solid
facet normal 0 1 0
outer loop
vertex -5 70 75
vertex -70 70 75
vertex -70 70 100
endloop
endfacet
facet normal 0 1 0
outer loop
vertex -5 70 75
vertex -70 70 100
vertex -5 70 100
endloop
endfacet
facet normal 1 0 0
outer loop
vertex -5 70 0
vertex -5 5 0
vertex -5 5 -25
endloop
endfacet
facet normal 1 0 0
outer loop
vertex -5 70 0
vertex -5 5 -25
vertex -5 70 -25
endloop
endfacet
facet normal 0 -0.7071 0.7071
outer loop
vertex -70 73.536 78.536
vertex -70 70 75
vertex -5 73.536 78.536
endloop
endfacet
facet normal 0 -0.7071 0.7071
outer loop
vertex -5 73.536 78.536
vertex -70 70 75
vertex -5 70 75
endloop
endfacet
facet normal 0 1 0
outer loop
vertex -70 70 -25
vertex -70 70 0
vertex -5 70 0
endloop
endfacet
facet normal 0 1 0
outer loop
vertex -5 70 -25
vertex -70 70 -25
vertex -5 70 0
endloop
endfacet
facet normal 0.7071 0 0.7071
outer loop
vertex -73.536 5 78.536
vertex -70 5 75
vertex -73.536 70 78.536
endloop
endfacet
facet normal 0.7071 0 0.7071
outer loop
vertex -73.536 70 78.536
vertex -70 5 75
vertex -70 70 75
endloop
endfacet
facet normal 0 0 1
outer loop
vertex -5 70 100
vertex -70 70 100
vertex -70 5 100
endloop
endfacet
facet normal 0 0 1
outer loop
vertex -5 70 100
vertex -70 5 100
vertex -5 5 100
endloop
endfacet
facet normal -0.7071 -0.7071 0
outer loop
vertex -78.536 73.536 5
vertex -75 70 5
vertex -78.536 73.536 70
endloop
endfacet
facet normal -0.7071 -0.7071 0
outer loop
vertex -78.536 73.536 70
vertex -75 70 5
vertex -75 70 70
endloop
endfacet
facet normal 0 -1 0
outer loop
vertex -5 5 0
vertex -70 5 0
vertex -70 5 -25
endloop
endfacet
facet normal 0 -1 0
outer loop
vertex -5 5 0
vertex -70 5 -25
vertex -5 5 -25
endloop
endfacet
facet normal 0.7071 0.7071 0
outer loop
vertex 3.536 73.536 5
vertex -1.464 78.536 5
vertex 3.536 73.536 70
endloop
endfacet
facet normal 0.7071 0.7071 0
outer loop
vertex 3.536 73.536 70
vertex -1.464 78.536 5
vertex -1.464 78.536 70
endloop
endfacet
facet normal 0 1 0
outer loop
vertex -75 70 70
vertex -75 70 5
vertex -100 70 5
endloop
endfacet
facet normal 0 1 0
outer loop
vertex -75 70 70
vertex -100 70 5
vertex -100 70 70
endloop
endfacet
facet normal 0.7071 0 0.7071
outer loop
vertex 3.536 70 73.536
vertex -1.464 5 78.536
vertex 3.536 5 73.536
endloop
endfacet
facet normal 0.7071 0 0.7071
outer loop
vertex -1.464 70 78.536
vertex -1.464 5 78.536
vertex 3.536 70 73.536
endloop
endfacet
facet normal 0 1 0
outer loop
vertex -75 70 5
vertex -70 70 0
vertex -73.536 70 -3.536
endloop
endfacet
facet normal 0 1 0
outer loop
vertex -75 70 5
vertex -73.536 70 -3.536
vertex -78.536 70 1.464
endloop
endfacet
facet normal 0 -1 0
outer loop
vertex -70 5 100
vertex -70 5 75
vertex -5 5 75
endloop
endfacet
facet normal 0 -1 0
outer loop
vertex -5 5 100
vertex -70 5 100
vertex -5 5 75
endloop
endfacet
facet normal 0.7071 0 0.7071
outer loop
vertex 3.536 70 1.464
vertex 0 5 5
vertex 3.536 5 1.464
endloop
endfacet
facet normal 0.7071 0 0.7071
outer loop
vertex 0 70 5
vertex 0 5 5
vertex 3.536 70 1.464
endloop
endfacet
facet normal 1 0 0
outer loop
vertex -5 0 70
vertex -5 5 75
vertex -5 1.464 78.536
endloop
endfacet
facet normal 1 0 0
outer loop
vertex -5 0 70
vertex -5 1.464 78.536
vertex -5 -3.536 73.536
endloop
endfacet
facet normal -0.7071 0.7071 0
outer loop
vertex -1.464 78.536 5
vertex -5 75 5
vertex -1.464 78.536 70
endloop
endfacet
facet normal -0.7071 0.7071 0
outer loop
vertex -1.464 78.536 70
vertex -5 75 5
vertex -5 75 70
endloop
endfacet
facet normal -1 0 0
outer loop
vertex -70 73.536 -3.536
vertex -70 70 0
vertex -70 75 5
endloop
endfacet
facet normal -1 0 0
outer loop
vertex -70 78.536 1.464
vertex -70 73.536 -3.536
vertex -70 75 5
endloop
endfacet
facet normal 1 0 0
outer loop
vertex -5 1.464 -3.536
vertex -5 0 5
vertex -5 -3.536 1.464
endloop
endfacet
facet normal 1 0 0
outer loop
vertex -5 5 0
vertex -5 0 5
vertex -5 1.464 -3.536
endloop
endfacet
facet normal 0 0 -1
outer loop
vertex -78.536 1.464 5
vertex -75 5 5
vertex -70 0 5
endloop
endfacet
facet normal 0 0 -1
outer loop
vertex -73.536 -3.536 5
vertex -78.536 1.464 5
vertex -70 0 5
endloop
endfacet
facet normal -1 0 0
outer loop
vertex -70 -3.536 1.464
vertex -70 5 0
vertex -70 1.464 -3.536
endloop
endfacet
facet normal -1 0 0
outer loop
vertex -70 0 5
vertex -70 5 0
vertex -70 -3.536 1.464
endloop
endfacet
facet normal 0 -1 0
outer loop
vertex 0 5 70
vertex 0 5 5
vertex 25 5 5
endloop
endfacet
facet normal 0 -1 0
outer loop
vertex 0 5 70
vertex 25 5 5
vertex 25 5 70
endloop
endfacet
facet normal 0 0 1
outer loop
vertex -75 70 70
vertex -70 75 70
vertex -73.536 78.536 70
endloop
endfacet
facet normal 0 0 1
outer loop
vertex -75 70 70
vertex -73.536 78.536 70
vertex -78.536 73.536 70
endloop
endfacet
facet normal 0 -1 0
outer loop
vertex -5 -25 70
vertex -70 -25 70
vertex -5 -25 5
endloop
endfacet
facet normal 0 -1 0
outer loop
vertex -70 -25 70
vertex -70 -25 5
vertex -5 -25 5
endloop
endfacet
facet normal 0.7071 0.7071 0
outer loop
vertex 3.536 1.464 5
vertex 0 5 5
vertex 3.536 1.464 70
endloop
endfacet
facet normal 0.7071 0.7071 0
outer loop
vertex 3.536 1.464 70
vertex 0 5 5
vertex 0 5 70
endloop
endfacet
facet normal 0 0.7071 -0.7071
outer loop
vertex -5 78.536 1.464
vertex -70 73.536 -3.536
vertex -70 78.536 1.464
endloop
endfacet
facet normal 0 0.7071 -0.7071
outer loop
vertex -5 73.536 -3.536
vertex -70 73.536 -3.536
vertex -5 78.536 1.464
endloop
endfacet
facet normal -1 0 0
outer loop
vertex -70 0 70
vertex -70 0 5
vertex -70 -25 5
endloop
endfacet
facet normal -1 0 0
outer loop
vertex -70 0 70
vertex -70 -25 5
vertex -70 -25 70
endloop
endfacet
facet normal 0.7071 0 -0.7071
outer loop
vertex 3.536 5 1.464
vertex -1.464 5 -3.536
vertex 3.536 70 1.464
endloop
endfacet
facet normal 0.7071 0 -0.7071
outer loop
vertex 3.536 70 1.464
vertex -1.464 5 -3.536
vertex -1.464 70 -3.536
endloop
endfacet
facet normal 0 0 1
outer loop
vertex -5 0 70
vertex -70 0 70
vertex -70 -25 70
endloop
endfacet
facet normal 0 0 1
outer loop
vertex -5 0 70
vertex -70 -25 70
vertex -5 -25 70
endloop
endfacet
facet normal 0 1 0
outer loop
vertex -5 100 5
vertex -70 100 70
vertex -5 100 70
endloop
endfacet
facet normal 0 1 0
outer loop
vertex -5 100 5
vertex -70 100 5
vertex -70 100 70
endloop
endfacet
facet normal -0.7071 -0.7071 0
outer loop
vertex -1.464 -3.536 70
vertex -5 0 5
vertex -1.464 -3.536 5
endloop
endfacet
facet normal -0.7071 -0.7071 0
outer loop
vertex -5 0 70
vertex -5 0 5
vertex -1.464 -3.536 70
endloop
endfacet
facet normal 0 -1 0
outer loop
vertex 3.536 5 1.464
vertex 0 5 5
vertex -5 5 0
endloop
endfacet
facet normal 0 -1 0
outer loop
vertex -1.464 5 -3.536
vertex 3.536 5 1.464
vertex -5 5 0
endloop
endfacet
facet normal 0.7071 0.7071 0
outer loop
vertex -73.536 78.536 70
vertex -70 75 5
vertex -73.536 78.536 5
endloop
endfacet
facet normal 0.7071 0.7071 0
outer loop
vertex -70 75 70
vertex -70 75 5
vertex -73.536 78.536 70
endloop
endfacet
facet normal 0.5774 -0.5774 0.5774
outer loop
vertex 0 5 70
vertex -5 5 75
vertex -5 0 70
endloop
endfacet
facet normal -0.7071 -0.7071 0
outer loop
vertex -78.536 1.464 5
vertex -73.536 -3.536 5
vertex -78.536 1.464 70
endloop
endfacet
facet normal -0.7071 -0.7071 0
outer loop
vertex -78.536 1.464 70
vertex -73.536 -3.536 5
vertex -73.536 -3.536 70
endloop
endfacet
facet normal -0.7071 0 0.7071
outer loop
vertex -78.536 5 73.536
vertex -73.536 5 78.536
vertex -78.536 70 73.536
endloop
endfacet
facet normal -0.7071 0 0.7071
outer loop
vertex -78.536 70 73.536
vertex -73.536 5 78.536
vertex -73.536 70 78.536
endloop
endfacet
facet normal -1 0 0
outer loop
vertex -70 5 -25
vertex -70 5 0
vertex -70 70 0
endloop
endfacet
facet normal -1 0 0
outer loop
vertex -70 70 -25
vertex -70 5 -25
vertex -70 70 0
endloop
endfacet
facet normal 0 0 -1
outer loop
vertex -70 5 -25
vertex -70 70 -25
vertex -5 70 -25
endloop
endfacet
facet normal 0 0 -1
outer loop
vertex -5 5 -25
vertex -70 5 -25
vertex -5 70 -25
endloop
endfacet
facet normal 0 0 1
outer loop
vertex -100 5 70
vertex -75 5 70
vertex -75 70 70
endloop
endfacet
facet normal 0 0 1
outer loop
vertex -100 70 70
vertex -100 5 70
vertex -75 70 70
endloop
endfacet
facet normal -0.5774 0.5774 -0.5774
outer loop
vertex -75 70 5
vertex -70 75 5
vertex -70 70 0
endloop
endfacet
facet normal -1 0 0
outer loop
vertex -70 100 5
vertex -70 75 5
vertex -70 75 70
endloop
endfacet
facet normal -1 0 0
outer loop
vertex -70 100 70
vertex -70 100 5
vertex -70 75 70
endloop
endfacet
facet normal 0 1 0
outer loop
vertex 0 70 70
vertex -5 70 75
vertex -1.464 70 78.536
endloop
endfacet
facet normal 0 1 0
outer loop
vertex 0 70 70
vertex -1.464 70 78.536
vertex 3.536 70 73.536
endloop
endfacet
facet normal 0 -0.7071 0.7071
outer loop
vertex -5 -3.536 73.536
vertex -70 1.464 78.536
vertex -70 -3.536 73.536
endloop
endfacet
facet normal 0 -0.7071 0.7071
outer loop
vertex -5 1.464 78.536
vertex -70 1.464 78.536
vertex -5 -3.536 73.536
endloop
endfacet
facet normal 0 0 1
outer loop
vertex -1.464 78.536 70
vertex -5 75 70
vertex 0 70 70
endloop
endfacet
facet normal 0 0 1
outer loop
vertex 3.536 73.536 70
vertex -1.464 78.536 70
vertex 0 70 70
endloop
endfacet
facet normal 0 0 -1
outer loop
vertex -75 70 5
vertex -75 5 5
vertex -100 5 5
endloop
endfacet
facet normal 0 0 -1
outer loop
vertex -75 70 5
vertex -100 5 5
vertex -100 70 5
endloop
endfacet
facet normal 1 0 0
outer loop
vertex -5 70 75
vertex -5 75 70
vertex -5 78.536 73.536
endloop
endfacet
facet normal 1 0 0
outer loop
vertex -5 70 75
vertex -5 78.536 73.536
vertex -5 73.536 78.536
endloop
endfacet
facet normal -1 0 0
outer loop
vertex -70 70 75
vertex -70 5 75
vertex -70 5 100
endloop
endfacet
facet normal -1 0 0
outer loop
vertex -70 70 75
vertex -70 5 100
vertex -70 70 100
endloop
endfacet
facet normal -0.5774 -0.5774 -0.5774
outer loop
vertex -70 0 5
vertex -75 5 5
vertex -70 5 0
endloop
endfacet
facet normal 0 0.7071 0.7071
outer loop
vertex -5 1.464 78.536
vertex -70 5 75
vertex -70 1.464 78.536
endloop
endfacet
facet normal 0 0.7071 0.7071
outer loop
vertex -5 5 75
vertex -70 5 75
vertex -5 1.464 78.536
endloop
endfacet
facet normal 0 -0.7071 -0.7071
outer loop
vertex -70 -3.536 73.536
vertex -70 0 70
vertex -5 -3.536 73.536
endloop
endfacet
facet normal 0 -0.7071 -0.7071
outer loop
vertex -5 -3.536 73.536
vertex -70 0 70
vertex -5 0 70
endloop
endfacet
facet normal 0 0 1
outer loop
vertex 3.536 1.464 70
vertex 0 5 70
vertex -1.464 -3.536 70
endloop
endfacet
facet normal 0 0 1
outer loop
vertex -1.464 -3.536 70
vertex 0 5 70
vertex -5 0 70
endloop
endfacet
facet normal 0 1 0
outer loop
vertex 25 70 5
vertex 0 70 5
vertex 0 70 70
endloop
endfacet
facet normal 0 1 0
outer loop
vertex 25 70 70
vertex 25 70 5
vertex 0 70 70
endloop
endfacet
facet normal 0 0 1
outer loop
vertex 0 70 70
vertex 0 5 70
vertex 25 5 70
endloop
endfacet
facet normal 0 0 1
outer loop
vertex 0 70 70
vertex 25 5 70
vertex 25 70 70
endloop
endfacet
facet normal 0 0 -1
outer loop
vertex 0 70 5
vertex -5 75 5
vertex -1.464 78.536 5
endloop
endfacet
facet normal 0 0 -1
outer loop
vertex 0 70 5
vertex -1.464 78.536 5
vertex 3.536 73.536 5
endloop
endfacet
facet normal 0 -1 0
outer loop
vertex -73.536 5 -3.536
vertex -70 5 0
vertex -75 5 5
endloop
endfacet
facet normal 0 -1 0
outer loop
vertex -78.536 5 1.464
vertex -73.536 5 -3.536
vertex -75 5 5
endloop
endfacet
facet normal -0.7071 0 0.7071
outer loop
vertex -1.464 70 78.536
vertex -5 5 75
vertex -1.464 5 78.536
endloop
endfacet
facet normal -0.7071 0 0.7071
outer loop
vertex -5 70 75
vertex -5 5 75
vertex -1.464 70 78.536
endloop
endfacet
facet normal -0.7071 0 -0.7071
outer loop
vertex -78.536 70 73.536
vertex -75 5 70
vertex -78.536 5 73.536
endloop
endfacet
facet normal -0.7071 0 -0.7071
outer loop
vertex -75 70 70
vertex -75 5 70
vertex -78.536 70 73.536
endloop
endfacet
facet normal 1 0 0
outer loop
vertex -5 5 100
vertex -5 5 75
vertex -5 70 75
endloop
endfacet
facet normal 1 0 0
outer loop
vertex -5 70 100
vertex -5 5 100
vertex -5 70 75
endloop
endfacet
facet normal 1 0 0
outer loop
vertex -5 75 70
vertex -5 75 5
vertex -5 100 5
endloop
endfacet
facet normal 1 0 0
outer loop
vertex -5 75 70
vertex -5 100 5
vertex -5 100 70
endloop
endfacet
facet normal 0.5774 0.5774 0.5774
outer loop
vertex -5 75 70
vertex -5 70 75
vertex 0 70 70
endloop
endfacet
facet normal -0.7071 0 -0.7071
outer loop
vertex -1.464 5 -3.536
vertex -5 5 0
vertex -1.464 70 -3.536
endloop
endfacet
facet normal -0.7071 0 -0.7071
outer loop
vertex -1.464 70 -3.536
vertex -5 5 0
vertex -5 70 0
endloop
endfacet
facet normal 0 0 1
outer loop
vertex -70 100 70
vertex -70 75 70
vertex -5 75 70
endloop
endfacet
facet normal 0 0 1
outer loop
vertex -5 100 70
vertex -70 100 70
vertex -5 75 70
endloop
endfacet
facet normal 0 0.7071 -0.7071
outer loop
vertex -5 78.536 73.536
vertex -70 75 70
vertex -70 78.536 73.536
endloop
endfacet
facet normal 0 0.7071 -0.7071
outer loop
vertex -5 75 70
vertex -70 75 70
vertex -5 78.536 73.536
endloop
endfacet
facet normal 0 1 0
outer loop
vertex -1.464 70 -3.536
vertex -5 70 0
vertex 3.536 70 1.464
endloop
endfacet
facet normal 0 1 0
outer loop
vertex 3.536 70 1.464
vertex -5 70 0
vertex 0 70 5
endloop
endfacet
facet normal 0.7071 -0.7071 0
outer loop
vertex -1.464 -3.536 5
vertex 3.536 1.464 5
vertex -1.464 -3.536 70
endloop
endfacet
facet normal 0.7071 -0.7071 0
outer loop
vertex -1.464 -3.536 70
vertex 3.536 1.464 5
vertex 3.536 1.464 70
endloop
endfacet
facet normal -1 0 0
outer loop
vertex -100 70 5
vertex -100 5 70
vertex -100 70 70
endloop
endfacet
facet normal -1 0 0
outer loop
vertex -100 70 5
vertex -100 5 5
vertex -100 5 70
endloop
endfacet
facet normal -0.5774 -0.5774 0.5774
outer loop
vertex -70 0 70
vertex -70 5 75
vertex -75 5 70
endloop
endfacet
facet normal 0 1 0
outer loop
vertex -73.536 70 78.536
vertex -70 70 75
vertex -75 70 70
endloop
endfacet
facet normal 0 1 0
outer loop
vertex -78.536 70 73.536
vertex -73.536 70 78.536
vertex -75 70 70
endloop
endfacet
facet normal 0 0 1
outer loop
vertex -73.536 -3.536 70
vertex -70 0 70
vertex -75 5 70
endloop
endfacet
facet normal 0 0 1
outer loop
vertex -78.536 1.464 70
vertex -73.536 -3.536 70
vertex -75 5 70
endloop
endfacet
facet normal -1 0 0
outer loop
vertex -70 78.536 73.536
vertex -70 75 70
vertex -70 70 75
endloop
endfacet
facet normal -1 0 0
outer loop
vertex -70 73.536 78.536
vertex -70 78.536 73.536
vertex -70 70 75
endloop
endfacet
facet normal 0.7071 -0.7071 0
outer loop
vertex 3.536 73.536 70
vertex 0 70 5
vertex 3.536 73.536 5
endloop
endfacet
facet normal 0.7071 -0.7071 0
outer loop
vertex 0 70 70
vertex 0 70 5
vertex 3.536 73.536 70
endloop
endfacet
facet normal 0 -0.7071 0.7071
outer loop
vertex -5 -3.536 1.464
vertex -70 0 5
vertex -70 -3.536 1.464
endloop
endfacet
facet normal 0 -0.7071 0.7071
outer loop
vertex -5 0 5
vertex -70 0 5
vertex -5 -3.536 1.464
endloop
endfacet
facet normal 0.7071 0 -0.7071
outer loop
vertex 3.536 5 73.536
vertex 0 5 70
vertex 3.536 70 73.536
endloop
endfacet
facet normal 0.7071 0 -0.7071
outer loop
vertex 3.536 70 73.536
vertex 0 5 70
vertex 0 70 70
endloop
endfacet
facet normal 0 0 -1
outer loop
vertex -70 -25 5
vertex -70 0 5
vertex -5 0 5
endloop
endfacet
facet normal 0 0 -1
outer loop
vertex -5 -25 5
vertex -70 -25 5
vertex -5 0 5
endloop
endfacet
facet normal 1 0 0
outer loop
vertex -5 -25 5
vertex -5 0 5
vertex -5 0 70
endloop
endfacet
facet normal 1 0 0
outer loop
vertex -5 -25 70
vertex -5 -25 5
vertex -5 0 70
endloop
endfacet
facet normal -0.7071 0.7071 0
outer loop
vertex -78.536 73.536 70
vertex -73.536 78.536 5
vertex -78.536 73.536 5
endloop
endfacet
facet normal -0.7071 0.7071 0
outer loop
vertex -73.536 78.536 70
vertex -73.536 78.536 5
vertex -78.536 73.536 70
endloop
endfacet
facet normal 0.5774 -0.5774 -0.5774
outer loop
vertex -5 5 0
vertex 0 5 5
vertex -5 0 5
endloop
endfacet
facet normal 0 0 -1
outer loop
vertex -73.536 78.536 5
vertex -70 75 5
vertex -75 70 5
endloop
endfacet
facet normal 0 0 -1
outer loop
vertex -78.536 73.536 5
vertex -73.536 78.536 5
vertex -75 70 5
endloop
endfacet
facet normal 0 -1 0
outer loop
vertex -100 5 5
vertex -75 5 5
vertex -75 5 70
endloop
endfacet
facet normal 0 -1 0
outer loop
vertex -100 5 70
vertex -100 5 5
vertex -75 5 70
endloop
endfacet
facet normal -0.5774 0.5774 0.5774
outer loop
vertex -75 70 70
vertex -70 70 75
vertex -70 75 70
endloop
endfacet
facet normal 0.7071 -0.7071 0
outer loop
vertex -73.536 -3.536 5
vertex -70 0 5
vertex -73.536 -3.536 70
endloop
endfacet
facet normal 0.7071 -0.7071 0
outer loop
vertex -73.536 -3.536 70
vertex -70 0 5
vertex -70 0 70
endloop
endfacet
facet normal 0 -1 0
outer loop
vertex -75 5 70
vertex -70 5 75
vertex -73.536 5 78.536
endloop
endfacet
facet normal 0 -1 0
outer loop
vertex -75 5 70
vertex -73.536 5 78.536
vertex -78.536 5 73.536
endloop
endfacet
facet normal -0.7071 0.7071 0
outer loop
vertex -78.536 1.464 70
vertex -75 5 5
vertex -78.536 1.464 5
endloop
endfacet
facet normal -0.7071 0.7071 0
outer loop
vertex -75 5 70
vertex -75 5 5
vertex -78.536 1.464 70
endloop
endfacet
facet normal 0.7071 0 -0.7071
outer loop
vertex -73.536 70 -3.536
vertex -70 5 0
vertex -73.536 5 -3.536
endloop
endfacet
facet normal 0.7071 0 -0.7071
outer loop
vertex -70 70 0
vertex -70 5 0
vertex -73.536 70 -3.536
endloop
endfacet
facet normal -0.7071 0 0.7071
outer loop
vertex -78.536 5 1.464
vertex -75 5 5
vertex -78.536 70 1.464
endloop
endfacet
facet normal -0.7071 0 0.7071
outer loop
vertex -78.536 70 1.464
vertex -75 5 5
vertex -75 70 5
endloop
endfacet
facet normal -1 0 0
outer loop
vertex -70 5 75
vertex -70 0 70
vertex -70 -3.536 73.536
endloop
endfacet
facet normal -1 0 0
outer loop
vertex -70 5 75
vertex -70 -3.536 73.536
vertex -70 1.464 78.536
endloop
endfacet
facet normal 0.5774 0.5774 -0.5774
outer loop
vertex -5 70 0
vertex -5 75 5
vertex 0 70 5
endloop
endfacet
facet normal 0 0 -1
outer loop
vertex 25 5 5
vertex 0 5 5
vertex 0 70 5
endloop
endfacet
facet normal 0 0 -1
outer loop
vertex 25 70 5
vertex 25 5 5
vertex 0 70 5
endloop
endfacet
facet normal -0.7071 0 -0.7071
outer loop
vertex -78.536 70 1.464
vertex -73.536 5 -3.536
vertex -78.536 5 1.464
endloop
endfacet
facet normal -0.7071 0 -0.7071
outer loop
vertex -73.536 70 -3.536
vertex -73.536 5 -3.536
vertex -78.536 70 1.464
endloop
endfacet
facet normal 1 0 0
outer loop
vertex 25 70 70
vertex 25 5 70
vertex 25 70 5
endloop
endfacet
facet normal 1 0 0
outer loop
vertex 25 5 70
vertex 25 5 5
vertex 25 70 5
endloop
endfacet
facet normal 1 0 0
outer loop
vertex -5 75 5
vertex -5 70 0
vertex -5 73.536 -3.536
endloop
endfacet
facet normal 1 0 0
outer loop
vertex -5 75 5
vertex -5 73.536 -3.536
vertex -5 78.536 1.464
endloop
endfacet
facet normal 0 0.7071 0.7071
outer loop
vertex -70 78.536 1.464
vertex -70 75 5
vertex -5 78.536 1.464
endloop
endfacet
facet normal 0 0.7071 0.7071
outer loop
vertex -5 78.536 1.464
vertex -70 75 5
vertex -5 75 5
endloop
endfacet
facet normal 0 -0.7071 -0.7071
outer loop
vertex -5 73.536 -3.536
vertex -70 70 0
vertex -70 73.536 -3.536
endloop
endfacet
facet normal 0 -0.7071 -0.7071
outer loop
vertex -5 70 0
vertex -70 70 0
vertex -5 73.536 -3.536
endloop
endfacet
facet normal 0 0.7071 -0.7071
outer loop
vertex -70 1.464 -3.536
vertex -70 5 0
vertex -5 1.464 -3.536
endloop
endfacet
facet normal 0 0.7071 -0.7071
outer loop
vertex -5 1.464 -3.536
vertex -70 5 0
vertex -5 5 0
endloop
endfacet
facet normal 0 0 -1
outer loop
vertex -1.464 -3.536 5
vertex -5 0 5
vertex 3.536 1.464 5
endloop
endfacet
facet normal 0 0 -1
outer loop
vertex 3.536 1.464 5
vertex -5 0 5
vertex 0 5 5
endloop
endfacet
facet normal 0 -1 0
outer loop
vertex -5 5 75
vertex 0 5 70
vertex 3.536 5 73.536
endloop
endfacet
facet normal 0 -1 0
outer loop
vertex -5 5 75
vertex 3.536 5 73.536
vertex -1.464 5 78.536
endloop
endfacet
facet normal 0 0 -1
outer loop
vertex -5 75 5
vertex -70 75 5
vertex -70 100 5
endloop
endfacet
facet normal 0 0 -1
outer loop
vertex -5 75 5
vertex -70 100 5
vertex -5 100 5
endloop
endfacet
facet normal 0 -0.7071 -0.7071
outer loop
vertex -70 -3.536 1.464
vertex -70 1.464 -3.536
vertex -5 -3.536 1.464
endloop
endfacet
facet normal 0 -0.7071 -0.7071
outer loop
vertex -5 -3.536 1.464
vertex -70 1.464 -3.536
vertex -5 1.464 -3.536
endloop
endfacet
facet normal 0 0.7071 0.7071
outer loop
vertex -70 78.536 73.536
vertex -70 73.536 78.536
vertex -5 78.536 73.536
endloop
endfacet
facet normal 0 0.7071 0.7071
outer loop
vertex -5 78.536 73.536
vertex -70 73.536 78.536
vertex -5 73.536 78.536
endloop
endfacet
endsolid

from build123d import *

# Parameters (mm, degrees)
F0_W      = 75
F0_H      = 75
F1_DEPTH  = 75
F2_SIZE   = 5
F3_DEPTH  = 5
F4_DEPTH  = 5
F5_DEPTH  = 5
F6_DEPTH  = 5
F7_DEPTH  = 5
F8_DEPTH  = 5
F9_DEPTH  = 5
F10_DEPTH = 5
F11_DEPTH = 5
F12_DEPTH = 5
F13_DEPTH = 5
F14_DEPTH = 5
F15_DEPTH = 25
F16_DEPTH = 25
F17_DEPTH = 25
F18_DEPTH = 25
F19_DEPTH = 25
F20_DEPTH = 25


with BuildPart() as f1:
    # F0 (on Top) → F1 (new body)
    with BuildSketch(Plane.XY):
        with Locations((-37.5, 37.5)):
            Rectangle(F0_W, F0_H)
    extrude(amount=F1_DEPTH)

    # F2
    f2_edges = [f1.edges().sort_by_distance(p)[0] for p in [
        (-75, 37.5, 75),
        (-37.5, 0, 75),
        (0, 37.5, 75),
        (-37.5, 75, 75),
        (0, 75, 37.5),
        (-75, 75, 37.5),
        (-37.5, 75, 0),
        (-75, 0, 37.5),
        (-75, 37.5, 0),
        (0, 37.5, 0),
        (0, 0, 37.5),
        (-37.5, 0, 0),
    ]]
    chamfer(f2_edges, length=F2_SIZE)

    # F3 (add): a face of the model
    f3_faces = [f1.faces().sort_by_distance(p)[0] for p in [
        (-72.5, 37.5, 72.5),
    ]]
    extrude(f3_faces, amount=F3_DEPTH)

    # F4 (add): a face of the model
    f4_faces = [f1.faces().sort_by_distance(p)[0] for p in [
        (-37.5, 72.5, 72.5),
    ]]
    extrude(f4_faces, amount=F4_DEPTH)

    # F5 (add): a face of the model
    f5_faces = [f1.faces().sort_by_distance(p)[0] for p in [
        (-2.5, 37.5, 72.5),
    ]]
    extrude(f5_faces, amount=F5_DEPTH)

    # F6 (add): a face of the model
    f6_faces = [f1.faces().sort_by_distance(p)[0] for p in [
        (-37.5, 2.5, 72.5),
    ]]
    extrude(f6_faces, amount=F6_DEPTH)

    # F7 (add): a face of the model
    f7_faces = [f1.faces().sort_by_distance(p)[0] for p in [
        (-2.5, 72.5, 37.5),
    ]]
    extrude(f7_faces, amount=F7_DEPTH)

    # F8 (add): a face of the model
    f8_faces = [f1.faces().sort_by_distance(p)[0] for p in [
        (-2.5, 37.5, 2.5),
    ]]
    extrude(f8_faces, amount=F8_DEPTH)

    # F9 (add): a face of the model
    f9_faces = [f1.faces().sort_by_distance(p)[0] for p in [
        (-2.5, 2.5, 37.5),
    ]]
    extrude(f9_faces, amount=F9_DEPTH)

    # F10 (add): a face of the model
    f10_faces = [f1.faces().sort_by_distance(p)[0] for p in [
        (-37.5, 72.5, 2.5),
    ]]
    extrude(f10_faces, amount=F10_DEPTH)

    # F11 (add): a face of the model
    f11_faces = [f1.faces().sort_by_distance(p)[0] for p in [
        (-37.5, 2.5, 2.5),
    ]]
    extrude(f11_faces, amount=F11_DEPTH)

    # F12 (add): a face of the model
    f12_faces = [f1.faces().sort_by_distance(p)[0] for p in [
        (-72.5, 72.5, 37.5),
    ]]
    extrude(f12_faces, amount=F12_DEPTH)

    # F13 (add): a face of the model
    f13_faces = [f1.faces().sort_by_distance(p)[0] for p in [
        (-72.5, 37.5, 2.5),
    ]]
    extrude(f13_faces, amount=F13_DEPTH)

    # F14 (add): a face of the model
    f14_faces = [f1.faces().sort_by_distance(p)[0] for p in [
        (-72.5, 2.5, 37.5),
    ]]
    extrude(f14_faces, amount=F14_DEPTH)

    # F15 (add): a face of the model
    f15_faces = [f1.faces().sort_by_distance(p)[0] for p in [
        (-75, 37.5, 37.5),
    ]]
    extrude(f15_faces, amount=F15_DEPTH)

    # F16 (add): a face of the model
    f16_faces = [f1.faces().sort_by_distance(p)[0] for p in [
        (-37.5, 37.5, 75),
    ]]
    extrude(f16_faces, amount=F16_DEPTH)

    # F17 (add): a face of the model
    f17_faces = [f1.faces().sort_by_distance(p)[0] for p in [
        (0, 37.5, 37.5),
    ]]
    extrude(f17_faces, amount=F17_DEPTH)

    # F18 (add): a face of the model
    f18_faces = [f1.faces().sort_by_distance(p)[0] for p in [
        (-37.5, 37.5, 0),
    ]]
    extrude(f18_faces, amount=F18_DEPTH)

    # F19 (add): a face of the model
    f19_faces = [f1.faces().sort_by_distance(p)[0] for p in [
        (-37.5, 0, 37.5),
    ]]
    extrude(f19_faces, amount=F19_DEPTH)

    # F20 (add): a face of the model
    f20_faces = [f1.faces().sort_by_distance(p)[0] for p in [
        (-37.5, 75, 37.5),
    ]]
    extrude(f20_faces, amount=F20_DEPTH)


solid = f1.part
